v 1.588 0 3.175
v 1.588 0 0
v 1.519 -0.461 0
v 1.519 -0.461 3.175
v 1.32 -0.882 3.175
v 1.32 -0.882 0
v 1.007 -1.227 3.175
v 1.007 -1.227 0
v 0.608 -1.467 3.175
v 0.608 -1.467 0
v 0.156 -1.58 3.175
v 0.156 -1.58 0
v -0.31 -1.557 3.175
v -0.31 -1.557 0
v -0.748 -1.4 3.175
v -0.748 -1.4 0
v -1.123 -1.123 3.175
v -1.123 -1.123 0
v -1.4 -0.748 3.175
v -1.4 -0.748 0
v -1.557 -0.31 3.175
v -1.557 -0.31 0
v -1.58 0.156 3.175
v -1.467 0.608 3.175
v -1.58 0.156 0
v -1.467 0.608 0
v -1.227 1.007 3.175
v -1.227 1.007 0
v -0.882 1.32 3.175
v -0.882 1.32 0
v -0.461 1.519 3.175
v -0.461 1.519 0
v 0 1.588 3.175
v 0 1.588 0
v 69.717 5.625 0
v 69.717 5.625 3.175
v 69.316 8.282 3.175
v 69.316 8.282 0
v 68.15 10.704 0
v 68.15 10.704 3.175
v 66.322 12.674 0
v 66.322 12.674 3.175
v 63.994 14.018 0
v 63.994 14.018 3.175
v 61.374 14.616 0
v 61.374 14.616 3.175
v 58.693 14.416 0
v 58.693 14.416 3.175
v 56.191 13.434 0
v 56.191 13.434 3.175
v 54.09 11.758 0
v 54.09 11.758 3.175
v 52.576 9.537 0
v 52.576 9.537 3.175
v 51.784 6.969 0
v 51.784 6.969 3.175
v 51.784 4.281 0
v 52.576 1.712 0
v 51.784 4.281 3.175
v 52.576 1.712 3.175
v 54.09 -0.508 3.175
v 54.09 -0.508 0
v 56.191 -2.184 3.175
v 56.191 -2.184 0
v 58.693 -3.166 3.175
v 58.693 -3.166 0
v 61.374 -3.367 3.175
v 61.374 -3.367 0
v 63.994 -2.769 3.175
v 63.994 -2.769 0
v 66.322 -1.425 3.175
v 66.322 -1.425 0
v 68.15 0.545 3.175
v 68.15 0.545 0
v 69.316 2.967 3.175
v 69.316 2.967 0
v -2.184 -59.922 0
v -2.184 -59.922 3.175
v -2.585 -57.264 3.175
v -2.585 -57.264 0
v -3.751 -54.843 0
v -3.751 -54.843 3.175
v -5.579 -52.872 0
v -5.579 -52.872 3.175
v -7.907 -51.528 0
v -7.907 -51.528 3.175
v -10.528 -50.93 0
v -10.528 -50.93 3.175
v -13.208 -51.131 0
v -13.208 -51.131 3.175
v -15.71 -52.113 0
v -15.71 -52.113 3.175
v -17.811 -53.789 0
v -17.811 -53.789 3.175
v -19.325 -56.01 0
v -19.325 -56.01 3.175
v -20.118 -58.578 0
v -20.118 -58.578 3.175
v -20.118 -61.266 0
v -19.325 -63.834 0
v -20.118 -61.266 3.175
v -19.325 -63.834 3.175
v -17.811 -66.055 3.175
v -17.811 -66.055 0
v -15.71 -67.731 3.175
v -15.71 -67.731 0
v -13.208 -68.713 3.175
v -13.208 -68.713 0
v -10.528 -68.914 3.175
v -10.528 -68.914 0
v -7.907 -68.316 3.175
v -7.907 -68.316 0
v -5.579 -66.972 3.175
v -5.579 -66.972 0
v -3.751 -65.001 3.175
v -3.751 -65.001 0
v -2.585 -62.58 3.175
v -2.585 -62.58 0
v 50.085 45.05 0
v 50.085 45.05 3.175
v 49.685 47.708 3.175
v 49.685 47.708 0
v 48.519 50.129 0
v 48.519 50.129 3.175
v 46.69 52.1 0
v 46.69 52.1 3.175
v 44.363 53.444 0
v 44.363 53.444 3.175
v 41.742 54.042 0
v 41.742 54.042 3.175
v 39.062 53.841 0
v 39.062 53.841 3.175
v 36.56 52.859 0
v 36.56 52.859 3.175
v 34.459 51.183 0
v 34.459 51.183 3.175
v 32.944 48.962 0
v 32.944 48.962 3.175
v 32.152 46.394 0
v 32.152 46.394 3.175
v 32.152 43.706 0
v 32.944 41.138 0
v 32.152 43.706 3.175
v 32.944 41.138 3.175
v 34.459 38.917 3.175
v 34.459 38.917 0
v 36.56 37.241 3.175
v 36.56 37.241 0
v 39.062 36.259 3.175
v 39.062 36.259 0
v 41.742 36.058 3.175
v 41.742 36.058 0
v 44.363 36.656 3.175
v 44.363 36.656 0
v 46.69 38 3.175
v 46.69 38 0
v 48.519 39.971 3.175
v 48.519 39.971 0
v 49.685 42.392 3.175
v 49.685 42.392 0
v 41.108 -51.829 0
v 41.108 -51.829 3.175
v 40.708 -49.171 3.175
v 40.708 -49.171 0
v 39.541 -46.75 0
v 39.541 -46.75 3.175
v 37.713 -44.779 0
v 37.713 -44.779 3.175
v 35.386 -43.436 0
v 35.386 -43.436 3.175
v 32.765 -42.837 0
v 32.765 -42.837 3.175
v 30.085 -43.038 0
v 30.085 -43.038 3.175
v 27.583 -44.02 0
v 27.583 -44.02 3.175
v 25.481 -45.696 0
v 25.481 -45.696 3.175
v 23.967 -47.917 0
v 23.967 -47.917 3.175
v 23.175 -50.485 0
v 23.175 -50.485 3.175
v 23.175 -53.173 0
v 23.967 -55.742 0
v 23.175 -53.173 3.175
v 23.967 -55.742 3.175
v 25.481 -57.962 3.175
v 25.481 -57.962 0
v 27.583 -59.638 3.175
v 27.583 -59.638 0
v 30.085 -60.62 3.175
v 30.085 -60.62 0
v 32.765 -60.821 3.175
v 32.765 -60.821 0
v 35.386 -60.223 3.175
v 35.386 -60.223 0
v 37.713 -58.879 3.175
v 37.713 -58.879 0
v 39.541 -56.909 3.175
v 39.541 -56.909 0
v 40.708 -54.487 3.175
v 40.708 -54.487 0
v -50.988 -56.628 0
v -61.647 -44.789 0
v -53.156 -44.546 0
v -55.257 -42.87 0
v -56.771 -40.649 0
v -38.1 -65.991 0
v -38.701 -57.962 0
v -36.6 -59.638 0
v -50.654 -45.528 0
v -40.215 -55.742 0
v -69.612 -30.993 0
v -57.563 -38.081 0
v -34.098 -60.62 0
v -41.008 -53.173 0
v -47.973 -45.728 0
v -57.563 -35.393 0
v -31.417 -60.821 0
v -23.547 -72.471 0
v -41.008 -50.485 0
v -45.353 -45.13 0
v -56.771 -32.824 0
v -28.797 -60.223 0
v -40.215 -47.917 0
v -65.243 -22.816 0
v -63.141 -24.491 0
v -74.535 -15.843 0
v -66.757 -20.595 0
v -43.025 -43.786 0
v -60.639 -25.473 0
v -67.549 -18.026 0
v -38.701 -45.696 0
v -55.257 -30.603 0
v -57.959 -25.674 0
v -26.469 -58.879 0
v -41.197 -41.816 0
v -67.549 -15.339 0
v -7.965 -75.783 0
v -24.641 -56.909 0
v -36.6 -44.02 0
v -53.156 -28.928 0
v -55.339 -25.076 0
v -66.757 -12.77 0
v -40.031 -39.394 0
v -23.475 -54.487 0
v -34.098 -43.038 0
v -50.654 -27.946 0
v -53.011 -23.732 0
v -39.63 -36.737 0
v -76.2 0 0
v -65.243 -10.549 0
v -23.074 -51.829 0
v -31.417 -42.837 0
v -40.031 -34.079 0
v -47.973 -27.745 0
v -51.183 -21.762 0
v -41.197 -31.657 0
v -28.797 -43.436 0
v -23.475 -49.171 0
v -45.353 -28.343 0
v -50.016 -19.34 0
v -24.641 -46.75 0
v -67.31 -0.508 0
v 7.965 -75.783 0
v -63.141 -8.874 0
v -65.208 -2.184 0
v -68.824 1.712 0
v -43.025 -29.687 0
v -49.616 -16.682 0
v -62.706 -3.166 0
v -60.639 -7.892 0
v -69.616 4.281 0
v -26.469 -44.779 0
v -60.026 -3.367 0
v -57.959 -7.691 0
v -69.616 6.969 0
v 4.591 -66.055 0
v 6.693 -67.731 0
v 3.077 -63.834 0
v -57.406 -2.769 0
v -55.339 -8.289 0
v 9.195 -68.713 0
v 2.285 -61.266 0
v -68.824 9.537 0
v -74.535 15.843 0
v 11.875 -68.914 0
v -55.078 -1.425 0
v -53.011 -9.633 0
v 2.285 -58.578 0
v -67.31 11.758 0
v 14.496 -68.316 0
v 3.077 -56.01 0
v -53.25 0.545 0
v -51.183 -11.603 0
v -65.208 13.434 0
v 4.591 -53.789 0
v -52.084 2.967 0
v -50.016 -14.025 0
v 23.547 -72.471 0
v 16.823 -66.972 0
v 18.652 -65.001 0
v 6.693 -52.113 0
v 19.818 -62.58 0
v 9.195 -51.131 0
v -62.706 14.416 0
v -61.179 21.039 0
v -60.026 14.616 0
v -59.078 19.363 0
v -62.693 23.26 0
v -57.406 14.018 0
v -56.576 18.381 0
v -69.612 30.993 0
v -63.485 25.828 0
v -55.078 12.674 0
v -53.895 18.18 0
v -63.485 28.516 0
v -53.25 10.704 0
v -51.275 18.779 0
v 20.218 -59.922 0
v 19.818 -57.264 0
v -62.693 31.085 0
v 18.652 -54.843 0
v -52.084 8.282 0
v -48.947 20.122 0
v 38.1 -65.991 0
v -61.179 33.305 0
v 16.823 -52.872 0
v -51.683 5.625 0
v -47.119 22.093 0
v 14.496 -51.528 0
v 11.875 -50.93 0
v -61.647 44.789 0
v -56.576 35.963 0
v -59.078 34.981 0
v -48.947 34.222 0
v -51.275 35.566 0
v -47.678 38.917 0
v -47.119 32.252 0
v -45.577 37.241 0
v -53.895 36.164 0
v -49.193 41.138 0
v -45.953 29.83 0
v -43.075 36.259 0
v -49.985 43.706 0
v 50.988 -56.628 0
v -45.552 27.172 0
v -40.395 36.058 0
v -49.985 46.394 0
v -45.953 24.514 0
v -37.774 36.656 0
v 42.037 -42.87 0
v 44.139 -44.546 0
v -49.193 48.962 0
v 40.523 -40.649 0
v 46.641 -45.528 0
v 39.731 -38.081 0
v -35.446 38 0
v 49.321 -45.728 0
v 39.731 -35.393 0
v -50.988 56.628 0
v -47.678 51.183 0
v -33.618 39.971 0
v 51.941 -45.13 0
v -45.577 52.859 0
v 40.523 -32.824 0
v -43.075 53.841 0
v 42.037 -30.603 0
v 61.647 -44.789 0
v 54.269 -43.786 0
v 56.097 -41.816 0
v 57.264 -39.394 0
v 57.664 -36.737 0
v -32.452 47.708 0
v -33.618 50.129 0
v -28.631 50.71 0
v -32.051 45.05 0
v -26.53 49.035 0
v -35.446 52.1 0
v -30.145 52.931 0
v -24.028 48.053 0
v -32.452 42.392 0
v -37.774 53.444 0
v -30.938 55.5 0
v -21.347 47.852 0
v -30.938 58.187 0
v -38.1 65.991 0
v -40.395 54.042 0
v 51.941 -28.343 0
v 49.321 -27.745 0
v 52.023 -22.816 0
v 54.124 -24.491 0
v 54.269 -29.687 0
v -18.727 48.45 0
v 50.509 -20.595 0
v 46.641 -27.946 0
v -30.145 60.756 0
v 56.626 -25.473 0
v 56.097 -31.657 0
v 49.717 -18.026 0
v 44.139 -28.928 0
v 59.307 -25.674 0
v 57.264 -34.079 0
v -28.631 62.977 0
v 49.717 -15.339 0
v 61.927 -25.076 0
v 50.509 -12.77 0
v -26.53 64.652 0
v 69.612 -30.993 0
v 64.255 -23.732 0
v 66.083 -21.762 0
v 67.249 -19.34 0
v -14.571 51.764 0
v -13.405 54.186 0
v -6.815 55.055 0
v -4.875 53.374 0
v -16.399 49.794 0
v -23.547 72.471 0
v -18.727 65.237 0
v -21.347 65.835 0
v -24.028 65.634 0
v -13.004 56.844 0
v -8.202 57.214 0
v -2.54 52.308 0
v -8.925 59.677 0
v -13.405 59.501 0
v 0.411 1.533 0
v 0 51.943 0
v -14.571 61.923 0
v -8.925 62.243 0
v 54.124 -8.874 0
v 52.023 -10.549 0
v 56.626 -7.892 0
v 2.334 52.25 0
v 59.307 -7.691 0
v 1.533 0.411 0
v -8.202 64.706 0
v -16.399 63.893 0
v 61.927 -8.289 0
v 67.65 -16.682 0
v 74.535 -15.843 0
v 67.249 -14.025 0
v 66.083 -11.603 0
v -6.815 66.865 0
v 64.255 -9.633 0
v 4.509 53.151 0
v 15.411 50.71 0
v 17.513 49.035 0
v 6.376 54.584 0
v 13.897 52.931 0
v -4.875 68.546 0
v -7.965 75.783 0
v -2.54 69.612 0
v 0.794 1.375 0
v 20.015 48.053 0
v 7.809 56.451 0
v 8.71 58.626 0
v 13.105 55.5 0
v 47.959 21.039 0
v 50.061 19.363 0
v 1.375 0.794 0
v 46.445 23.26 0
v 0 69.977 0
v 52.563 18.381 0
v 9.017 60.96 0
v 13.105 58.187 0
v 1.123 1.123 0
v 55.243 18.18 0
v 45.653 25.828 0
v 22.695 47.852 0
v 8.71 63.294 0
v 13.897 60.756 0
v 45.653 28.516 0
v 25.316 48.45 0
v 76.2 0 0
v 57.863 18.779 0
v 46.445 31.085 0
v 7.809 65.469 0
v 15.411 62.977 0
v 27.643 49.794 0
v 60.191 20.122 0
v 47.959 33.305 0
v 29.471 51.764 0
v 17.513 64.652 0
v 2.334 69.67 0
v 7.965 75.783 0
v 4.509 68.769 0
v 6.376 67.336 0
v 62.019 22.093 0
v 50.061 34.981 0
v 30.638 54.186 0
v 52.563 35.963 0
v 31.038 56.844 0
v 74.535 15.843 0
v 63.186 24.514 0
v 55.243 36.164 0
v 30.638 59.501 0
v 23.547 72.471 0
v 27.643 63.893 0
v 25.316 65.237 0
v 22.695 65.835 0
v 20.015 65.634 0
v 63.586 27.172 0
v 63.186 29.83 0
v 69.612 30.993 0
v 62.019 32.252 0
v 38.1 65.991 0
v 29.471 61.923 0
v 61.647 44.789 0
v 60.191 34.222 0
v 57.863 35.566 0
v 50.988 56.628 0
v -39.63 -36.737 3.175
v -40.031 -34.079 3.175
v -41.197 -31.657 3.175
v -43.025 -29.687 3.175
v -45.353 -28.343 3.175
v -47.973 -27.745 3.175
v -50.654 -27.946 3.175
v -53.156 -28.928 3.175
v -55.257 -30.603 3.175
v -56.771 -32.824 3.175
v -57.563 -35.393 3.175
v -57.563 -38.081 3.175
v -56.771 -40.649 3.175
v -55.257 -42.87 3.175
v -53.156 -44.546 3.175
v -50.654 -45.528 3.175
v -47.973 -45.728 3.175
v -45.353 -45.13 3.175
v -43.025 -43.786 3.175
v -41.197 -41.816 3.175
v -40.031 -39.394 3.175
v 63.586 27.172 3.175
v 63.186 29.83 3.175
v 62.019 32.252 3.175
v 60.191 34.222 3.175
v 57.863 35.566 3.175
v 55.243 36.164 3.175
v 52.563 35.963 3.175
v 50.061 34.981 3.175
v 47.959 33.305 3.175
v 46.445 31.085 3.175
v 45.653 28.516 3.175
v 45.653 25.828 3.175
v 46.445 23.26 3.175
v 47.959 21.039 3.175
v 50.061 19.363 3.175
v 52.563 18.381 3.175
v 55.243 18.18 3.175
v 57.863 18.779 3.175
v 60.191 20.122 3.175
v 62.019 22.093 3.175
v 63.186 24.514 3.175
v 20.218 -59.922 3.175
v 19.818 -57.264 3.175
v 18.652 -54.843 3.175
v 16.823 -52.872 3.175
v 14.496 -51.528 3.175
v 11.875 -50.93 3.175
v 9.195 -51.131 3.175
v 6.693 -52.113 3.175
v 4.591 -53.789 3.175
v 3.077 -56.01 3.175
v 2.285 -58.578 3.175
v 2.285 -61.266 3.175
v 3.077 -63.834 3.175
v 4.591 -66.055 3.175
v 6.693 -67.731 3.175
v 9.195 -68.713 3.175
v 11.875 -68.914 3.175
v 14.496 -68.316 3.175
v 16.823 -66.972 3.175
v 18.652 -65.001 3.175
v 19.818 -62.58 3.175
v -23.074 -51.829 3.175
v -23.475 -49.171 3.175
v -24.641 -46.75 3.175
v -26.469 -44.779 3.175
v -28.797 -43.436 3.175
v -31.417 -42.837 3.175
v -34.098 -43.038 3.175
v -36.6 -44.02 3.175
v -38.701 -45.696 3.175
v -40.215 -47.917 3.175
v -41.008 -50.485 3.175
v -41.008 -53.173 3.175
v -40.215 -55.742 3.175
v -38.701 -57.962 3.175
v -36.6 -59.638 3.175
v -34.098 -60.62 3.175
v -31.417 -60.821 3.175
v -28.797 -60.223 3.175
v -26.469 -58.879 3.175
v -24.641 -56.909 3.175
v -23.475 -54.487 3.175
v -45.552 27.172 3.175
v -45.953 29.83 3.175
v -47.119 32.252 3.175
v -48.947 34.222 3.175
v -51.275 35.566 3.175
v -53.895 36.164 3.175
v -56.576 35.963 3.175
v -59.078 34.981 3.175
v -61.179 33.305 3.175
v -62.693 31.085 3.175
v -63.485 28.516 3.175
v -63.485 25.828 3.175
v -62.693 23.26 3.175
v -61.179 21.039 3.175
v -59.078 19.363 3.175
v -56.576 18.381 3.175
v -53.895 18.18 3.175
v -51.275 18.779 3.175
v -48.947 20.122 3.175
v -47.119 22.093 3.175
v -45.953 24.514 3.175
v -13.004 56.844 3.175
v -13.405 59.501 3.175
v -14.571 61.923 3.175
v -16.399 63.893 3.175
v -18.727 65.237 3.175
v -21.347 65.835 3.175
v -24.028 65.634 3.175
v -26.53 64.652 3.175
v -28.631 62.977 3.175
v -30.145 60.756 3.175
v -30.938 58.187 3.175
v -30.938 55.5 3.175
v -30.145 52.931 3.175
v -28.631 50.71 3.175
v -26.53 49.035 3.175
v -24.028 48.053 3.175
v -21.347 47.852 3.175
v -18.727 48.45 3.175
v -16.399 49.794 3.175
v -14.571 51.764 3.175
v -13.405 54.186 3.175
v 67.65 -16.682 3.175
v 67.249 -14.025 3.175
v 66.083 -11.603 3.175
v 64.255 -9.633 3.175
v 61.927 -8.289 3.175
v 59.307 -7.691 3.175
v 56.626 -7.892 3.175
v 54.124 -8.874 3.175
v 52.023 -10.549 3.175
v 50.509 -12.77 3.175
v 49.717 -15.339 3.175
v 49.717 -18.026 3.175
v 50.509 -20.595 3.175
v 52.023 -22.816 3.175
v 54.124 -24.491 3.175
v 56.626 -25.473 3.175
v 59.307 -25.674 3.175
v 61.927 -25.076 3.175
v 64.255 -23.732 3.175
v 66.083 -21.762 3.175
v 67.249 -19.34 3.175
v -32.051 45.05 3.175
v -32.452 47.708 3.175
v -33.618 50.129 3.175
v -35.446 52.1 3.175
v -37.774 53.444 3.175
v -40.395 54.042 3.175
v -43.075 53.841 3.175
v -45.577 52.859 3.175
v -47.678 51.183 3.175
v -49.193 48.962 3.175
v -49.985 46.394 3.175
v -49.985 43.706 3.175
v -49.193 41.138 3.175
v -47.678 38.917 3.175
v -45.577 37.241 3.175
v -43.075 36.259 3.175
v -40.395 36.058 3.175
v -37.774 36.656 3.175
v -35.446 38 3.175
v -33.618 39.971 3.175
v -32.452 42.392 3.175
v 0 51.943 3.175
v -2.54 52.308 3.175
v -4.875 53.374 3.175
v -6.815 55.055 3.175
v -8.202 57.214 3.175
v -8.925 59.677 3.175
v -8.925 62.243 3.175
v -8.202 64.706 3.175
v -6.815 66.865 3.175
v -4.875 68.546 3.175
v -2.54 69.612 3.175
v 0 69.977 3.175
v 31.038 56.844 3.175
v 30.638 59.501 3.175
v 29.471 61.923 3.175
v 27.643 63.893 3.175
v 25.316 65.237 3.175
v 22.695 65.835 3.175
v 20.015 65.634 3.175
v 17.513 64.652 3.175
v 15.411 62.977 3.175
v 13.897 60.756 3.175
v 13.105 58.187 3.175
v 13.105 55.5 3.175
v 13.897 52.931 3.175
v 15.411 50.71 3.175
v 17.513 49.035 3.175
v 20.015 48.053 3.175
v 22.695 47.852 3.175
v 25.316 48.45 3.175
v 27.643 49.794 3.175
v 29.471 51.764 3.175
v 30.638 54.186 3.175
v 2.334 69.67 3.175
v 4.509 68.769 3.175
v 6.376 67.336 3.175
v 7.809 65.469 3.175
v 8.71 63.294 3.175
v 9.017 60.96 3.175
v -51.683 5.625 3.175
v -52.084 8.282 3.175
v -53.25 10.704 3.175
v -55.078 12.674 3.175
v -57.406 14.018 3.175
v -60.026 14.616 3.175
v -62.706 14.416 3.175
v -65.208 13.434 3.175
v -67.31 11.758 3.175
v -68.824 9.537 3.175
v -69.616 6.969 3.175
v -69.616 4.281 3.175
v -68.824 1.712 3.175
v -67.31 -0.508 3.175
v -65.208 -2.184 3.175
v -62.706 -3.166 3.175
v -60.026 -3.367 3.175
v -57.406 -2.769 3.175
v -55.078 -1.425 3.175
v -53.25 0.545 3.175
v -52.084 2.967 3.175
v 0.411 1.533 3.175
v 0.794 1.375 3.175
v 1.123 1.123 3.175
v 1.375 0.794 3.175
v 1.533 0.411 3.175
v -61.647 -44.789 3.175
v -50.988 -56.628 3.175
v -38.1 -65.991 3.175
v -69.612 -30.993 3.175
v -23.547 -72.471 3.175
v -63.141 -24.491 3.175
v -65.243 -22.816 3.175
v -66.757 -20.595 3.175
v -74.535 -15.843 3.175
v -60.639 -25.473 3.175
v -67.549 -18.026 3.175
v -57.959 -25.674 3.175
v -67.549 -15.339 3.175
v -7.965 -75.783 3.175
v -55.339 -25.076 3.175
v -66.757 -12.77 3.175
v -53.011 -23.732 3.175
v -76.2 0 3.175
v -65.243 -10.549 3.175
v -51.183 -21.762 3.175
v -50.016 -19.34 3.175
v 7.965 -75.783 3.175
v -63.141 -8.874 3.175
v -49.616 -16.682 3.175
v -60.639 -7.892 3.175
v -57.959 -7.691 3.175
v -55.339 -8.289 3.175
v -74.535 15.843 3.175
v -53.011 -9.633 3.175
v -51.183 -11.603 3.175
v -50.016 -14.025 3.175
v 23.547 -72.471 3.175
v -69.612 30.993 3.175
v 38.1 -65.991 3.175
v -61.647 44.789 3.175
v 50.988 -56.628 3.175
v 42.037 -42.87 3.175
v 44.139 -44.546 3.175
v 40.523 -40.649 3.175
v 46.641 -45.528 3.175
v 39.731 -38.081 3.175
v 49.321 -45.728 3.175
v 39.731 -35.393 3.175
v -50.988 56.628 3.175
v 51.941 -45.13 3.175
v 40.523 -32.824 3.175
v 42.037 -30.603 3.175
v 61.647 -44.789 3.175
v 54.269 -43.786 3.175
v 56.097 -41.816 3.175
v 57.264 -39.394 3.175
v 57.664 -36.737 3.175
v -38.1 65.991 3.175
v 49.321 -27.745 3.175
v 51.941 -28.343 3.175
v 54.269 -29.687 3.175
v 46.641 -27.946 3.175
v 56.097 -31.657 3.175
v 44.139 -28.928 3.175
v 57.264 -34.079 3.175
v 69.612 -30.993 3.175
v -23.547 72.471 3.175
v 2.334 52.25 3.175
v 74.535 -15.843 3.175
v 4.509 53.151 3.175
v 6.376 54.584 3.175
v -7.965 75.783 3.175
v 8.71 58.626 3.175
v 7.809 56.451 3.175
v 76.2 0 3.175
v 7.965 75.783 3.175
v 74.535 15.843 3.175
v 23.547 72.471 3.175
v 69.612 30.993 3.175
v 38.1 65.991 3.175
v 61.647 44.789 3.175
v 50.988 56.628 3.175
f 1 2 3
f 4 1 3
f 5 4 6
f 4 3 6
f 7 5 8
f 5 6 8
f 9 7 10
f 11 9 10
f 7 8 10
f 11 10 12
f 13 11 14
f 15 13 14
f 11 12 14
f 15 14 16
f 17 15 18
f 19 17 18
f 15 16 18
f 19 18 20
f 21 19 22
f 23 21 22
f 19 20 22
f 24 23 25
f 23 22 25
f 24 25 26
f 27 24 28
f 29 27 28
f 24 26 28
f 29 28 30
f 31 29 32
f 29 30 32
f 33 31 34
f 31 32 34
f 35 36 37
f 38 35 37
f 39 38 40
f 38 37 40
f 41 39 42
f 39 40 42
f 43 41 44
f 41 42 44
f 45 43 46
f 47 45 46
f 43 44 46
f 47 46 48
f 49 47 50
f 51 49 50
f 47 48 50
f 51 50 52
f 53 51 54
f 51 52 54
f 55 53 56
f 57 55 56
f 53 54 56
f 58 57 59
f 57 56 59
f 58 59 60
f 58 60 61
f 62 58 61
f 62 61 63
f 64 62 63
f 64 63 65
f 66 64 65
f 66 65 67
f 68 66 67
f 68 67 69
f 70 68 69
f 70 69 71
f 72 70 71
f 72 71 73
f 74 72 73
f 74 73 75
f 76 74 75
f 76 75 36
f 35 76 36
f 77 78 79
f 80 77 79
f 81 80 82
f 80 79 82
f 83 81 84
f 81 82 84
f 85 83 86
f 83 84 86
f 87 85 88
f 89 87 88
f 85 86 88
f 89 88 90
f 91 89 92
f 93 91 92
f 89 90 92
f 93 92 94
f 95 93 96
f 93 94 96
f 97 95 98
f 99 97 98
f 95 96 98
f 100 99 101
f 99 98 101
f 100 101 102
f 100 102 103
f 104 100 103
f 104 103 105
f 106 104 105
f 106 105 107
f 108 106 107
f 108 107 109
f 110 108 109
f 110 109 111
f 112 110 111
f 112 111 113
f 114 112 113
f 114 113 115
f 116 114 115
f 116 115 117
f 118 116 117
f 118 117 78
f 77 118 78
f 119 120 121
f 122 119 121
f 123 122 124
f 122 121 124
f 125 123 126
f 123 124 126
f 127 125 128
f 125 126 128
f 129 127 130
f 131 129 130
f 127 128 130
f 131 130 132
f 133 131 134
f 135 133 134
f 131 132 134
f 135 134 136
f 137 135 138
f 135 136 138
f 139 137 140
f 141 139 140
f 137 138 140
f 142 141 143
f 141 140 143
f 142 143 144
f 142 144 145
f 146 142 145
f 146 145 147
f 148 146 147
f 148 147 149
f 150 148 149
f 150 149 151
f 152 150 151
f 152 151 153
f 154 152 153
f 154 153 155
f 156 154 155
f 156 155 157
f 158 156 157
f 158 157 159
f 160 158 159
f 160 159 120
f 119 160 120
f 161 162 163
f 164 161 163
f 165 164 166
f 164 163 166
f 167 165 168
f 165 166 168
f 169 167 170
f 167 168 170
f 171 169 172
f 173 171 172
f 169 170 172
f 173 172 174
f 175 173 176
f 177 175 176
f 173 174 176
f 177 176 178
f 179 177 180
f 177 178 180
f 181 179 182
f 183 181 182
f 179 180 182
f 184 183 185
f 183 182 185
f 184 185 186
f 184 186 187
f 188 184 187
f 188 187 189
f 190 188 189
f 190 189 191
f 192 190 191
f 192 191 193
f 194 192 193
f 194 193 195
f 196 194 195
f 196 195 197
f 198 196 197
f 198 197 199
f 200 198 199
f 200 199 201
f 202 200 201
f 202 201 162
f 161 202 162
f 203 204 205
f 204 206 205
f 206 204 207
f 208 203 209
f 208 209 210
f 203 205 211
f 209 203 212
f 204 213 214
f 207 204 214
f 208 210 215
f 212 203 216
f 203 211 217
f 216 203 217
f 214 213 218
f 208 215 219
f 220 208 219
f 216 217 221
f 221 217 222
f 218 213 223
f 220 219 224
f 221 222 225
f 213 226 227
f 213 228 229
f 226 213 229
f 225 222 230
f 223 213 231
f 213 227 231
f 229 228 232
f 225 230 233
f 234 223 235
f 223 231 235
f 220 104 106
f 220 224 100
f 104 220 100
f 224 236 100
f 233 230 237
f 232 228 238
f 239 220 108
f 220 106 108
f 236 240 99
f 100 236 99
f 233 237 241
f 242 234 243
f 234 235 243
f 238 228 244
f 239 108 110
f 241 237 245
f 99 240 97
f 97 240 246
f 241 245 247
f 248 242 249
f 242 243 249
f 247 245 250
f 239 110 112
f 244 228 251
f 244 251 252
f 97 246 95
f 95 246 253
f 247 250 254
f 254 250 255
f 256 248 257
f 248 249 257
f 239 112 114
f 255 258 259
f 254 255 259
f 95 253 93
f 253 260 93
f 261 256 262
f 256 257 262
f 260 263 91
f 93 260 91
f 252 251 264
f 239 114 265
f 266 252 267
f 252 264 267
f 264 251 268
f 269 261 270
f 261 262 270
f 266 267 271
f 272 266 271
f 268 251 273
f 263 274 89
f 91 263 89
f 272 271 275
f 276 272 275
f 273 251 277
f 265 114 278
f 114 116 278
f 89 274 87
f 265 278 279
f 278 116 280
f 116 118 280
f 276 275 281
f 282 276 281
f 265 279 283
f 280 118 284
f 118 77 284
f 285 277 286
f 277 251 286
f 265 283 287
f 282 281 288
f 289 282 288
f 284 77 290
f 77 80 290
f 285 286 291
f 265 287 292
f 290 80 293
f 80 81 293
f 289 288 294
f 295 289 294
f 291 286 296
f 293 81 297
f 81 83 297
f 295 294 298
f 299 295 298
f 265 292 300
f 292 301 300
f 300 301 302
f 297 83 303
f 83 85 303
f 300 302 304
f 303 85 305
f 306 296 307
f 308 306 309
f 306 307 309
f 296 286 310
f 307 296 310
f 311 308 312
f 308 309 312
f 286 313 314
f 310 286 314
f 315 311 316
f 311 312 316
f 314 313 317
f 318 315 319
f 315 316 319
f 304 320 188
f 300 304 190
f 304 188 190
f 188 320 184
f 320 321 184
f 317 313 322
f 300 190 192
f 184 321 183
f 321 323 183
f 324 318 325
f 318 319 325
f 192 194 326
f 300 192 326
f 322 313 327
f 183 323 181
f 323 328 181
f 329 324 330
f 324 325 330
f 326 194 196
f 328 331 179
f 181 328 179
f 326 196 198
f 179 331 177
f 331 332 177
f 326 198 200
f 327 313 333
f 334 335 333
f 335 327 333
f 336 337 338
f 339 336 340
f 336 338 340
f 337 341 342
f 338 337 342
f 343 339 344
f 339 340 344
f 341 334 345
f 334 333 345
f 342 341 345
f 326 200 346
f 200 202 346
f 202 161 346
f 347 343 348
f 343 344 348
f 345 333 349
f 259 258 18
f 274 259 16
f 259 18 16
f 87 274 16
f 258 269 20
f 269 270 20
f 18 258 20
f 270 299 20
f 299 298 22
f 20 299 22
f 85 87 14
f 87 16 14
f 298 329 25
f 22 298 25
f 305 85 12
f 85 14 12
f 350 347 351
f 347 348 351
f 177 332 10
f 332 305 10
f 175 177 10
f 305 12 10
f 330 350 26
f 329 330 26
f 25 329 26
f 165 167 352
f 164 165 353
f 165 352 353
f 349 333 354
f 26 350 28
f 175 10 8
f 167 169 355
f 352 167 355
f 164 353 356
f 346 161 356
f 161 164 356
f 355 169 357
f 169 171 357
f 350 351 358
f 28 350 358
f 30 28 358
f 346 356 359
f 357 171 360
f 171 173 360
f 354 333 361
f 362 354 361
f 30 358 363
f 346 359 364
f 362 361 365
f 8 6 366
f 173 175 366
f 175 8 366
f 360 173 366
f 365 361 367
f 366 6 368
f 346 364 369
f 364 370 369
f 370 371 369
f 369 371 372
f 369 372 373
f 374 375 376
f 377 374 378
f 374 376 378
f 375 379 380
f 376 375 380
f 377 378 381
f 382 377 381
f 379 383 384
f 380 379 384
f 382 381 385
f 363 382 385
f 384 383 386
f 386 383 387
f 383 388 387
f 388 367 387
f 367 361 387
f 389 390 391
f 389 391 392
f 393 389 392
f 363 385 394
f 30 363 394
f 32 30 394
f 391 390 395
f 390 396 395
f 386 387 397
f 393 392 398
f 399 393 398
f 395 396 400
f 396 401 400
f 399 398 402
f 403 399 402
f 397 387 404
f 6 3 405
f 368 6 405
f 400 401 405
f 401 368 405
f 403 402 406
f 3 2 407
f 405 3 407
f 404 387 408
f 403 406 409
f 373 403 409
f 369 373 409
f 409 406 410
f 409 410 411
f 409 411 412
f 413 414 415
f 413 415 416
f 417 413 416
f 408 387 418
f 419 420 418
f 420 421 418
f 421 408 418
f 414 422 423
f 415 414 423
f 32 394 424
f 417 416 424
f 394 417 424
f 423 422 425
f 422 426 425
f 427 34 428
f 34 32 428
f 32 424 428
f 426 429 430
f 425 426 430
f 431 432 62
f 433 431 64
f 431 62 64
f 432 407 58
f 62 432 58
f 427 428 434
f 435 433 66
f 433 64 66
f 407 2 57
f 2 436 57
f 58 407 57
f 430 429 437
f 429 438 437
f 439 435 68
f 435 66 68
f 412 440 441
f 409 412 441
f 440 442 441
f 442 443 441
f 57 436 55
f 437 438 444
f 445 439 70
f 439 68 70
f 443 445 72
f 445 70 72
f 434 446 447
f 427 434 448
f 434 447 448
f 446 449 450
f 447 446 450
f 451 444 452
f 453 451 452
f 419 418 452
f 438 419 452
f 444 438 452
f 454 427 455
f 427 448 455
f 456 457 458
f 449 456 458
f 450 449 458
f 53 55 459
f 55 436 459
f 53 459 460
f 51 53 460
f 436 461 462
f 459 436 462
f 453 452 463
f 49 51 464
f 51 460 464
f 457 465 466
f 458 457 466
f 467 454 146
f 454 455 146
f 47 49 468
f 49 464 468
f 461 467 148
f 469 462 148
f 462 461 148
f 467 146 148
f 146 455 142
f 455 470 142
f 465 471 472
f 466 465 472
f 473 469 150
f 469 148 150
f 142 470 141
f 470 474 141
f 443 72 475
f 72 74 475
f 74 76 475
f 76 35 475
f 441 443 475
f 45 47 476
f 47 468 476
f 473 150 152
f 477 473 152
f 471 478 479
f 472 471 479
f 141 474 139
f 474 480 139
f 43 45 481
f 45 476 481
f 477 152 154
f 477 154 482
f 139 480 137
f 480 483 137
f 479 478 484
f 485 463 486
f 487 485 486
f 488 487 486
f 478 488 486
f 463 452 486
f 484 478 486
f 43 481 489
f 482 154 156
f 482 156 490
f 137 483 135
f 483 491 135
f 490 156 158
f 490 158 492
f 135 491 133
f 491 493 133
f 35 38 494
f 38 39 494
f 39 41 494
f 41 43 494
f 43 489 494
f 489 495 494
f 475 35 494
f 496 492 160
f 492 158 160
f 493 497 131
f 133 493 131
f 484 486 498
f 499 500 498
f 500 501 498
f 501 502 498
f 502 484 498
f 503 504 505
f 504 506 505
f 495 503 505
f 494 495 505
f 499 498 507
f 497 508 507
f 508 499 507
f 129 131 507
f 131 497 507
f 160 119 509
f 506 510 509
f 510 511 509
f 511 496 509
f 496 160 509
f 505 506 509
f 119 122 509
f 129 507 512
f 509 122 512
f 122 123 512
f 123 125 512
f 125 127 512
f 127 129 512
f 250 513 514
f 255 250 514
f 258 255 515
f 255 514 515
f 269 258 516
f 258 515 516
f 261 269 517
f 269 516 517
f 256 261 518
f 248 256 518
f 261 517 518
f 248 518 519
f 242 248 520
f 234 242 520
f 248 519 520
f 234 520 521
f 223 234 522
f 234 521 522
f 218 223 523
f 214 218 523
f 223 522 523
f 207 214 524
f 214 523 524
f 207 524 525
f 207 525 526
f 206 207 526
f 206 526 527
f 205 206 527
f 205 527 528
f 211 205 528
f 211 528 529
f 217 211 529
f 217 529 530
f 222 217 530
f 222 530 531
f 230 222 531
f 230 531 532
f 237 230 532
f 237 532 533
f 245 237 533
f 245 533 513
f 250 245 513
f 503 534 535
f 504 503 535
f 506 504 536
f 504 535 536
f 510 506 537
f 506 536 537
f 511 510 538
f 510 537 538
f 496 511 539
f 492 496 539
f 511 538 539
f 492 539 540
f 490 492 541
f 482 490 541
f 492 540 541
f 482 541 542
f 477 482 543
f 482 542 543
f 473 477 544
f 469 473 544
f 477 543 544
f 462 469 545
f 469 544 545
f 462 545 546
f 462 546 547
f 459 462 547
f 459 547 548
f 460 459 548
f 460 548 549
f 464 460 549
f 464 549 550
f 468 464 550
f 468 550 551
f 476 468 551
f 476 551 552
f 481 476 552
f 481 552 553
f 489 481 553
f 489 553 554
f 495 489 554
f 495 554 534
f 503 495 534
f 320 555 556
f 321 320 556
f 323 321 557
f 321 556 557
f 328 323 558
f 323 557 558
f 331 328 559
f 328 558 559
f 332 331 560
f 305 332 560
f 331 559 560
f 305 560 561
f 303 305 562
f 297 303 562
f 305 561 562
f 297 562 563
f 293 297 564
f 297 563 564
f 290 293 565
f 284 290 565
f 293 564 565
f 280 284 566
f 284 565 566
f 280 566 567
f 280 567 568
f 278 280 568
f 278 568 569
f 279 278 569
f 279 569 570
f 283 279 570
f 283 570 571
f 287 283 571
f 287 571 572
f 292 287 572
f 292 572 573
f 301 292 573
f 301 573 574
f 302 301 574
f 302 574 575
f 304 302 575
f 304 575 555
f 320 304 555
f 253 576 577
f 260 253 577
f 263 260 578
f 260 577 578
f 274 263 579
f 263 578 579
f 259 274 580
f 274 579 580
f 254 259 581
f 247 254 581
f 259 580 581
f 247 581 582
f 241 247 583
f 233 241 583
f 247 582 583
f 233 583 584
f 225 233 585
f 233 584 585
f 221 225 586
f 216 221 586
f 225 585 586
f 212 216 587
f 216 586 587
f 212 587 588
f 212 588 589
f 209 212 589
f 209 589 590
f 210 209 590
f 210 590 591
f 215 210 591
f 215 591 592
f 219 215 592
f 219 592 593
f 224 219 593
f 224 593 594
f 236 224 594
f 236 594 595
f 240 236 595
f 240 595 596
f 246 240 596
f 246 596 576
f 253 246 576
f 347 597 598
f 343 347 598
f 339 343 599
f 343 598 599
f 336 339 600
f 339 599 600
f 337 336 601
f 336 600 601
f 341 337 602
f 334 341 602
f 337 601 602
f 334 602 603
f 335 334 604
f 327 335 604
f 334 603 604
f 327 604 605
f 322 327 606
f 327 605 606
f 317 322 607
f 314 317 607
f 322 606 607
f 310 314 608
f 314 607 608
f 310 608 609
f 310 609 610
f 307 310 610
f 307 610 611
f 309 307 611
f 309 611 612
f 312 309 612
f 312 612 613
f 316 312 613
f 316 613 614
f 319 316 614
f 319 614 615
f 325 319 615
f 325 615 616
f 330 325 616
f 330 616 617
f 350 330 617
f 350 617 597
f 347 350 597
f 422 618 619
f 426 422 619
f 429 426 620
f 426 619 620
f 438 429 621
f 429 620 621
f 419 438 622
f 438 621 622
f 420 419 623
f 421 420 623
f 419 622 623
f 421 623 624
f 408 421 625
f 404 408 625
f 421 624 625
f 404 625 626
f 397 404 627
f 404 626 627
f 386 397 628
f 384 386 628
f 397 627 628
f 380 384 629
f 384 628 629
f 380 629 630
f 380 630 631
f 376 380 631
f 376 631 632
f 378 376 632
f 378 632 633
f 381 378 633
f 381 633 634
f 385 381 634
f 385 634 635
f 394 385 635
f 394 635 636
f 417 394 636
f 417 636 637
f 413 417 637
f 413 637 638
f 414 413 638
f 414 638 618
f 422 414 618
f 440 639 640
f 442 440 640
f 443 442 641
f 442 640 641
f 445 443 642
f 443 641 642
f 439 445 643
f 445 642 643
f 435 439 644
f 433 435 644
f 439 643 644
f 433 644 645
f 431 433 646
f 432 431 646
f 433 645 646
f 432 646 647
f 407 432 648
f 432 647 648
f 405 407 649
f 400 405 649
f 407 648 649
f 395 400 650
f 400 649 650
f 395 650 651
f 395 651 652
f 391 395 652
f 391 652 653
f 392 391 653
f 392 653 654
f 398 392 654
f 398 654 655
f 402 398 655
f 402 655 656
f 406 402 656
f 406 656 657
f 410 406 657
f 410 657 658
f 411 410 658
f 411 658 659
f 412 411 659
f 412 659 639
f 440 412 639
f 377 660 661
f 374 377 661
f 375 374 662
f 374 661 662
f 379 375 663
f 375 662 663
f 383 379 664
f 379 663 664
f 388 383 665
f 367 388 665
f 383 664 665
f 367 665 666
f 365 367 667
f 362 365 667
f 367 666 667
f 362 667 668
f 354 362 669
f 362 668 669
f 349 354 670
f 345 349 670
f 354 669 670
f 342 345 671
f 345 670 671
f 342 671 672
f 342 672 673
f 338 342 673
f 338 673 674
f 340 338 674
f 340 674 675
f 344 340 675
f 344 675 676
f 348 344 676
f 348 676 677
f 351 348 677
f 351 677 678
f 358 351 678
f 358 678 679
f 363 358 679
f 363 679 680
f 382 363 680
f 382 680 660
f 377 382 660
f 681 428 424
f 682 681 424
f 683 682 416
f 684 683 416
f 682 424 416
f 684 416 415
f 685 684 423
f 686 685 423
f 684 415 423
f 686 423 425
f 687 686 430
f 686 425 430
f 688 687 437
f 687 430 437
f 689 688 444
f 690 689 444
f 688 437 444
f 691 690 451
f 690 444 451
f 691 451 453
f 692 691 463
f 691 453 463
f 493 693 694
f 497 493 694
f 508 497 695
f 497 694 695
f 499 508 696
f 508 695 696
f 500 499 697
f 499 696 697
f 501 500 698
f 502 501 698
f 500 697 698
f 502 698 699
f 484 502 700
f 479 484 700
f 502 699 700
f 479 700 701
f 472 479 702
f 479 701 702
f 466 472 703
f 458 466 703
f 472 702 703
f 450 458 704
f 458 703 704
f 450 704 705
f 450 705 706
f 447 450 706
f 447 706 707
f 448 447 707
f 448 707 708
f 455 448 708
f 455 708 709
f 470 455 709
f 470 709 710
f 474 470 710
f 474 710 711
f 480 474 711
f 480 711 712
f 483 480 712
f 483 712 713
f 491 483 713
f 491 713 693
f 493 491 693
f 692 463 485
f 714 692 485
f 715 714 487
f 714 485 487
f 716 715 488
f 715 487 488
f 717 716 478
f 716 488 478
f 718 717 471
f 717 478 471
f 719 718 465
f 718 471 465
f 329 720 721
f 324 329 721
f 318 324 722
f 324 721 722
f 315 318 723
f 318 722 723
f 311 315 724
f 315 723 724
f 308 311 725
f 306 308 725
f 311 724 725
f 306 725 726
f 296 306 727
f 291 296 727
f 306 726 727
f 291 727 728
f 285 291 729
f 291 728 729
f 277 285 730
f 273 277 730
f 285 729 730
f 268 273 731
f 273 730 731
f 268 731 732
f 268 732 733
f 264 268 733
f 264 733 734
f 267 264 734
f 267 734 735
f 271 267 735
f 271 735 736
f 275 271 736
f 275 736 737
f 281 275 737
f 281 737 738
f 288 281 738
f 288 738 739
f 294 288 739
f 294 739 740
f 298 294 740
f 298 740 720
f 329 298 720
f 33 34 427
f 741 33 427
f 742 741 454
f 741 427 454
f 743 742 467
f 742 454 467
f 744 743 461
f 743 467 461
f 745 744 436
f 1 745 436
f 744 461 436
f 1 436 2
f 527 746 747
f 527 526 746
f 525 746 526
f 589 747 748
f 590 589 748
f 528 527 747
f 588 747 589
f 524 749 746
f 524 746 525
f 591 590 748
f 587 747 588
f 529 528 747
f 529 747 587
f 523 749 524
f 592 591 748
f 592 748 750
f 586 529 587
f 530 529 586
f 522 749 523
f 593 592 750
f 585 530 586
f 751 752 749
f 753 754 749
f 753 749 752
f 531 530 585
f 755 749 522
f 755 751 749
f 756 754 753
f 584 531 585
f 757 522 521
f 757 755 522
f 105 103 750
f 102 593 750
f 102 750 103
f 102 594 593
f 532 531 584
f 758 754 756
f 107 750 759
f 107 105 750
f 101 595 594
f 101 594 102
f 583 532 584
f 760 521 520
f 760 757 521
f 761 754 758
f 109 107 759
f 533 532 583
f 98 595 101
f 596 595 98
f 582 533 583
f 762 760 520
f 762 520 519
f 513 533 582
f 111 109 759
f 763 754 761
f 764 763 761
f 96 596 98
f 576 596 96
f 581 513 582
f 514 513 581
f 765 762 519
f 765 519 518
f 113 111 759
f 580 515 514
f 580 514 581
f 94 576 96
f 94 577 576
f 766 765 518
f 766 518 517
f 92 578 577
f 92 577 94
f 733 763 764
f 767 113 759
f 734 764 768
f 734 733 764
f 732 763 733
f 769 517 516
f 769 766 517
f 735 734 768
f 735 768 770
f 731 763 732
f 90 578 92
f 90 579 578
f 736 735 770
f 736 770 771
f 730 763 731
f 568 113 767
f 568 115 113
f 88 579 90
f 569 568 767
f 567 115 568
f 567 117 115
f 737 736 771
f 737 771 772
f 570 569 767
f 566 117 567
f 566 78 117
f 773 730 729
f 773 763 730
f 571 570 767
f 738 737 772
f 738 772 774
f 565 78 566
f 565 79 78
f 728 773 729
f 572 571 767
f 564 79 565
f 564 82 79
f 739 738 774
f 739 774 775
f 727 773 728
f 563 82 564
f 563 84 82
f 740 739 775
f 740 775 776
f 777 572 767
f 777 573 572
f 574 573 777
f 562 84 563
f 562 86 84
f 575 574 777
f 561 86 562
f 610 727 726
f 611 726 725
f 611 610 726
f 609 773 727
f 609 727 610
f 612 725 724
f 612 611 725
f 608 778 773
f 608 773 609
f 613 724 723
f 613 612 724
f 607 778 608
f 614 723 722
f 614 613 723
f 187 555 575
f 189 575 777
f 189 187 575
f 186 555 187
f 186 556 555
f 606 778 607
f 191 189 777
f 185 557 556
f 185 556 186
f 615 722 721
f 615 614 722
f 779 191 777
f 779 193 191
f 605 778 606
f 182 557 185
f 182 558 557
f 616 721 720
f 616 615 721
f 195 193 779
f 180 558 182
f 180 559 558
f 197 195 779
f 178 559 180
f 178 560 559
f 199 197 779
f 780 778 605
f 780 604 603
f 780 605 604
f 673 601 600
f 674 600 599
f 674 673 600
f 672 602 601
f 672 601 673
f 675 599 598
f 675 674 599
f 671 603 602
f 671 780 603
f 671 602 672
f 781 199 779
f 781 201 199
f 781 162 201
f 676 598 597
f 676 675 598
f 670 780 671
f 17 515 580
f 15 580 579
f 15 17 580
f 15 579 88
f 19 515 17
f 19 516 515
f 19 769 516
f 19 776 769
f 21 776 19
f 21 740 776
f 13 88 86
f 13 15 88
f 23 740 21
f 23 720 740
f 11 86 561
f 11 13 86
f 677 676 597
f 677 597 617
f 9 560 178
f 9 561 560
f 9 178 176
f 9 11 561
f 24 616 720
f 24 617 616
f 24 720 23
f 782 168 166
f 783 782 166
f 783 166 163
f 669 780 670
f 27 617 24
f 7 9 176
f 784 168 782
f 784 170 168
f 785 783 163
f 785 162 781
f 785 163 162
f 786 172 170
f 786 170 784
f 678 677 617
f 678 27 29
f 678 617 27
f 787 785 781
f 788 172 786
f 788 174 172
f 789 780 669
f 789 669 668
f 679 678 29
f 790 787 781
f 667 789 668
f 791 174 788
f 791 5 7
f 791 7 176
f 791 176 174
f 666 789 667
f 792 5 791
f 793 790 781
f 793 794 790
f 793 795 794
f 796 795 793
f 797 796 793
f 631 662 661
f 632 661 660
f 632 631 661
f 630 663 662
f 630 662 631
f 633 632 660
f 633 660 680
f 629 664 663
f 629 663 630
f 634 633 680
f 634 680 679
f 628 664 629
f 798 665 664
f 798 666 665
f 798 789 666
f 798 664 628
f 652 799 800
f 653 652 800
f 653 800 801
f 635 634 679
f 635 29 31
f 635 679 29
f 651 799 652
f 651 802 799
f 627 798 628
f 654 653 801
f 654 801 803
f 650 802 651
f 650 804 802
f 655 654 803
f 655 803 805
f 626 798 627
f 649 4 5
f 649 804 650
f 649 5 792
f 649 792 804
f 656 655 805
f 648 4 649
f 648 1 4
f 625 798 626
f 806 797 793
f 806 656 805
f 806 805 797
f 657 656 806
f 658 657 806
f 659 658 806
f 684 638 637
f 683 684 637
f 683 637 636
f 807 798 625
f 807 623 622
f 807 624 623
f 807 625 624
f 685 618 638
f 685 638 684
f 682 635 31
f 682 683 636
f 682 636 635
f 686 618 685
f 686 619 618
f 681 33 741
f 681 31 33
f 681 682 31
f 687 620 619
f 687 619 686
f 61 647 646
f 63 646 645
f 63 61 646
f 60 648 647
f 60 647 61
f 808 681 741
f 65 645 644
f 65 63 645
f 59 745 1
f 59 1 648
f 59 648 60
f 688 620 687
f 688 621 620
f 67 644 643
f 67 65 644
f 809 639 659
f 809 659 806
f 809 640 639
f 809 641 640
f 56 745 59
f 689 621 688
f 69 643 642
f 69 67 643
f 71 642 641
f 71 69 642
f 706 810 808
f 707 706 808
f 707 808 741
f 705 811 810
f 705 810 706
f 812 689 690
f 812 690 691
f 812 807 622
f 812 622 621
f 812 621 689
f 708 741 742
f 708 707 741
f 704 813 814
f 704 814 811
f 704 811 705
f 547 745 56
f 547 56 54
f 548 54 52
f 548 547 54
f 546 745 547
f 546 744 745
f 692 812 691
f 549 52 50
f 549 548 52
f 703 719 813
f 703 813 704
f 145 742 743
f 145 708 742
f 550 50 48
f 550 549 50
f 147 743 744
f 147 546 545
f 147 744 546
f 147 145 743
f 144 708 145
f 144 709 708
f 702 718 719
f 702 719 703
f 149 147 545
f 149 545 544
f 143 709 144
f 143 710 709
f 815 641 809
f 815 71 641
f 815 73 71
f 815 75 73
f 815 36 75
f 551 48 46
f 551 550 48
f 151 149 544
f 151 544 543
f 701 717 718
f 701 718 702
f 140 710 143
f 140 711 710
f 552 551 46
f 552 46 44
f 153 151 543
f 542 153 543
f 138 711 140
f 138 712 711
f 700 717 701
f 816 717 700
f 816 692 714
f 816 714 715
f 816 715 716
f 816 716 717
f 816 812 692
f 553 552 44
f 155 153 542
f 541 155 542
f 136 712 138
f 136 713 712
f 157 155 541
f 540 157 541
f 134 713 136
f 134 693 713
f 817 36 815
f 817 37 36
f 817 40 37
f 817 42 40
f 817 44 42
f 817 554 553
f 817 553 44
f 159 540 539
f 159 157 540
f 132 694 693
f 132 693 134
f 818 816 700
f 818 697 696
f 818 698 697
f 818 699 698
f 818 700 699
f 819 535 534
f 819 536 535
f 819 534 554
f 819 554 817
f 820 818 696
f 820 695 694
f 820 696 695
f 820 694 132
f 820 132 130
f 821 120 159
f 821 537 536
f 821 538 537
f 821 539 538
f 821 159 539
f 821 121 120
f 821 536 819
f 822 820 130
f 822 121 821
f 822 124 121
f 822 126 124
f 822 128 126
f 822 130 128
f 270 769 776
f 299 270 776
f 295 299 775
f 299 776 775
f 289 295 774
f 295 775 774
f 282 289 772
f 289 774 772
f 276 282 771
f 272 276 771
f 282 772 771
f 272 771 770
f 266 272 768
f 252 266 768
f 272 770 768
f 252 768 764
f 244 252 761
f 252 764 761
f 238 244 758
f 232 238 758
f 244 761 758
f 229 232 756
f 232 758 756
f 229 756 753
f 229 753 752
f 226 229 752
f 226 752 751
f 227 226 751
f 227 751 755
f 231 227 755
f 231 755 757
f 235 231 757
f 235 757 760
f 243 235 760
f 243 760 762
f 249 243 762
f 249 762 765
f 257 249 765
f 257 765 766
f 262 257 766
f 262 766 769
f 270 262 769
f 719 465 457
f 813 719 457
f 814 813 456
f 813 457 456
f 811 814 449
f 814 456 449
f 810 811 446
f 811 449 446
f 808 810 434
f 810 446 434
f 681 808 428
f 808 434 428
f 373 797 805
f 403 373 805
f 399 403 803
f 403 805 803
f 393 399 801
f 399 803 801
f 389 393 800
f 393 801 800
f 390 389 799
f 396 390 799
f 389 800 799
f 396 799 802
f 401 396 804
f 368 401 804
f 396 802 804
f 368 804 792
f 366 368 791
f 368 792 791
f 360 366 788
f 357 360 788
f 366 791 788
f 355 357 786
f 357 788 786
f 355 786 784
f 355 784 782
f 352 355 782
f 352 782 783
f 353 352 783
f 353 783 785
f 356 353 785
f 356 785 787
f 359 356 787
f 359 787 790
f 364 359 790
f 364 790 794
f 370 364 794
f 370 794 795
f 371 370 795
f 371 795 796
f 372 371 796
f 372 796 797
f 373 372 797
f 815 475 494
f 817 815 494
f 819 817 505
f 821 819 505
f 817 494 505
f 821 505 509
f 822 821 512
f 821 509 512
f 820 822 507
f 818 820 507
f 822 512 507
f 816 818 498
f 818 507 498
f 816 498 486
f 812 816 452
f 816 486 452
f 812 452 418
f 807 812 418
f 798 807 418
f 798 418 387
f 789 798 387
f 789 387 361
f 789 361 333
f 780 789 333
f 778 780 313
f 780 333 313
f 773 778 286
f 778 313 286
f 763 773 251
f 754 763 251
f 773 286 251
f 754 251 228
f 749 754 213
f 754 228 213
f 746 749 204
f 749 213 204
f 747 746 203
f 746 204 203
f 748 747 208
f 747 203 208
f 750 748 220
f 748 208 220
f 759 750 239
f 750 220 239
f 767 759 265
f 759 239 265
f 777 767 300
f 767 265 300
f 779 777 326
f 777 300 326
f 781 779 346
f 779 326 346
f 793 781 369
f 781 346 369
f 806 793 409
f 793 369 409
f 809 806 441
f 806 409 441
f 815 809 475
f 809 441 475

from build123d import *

# Parameters (mm, degrees)
F1_DEPTH  = 25.4
F2_DEPTH  = 3.175
F3_COUNT  = 17
F1_FACE_R = 9.017
F3_FACE_R = 9.017
F4_DEPTH  = 25.4


with BuildPart() as f1:
    # F0 (on Top) → F1 (new body)
    with BuildSketch(Plane.XY):
        with BuildLine():
            ThreePointArc((9.017, 60.96), (6.375981846, 67.335981846), (0, 69.977))
            Line((0, 69.977), (0, 51.943))
            ThreePointArc((0, 51.943), (6.375981846, 54.584018154), (9.017, 60.96))
        make_face()
        with BuildLine():
            Line((0, 51.943), (0, 69.977))
            ThreePointArc((0, 69.977), (-9.017, 60.96), (0, 51.943))
        make_face()
    extrude(amount=F1_DEPTH)


with BuildPart() as f2:
    # F0 (on Top) → F2 (new body)
    with BuildSketch(Plane.XY):
        with BuildLine():
            ThreePointArc((0, 76.2), (-53.8815367264, -53.8815367264), (76.2, 0))
            ThreePointArc((76.2, 0), (53.8815367264, 53.8815367264), (0, 76.2))
        make_face()
        with BuildLine():
            ThreePointArc((1.5875, 0), (-1.1225320151, -1.1225320151), (0, 1.5875))
            ThreePointArc((0, 1.5875), (1.1225320151, 1.1225320151), (1.5875, 0))
        make_face(mode=Mode.SUBTRACT)
        with BuildLine():
            ThreePointArc((0, 51.943), (-9.017, 60.96), (0, 69.977))
            ThreePointArc((0, 69.977), (6.375981846, 67.335981846), (9.017, 60.96))
            ThreePointArc((9.017, 60.96), (6.375981846, 54.584018154), (0, 51.943))
        make_face(mode=Mode.SUBTRACT)
    extrude(amount=F2_DEPTH)


with BuildPart() as f3_1:
    # F3: instance of F1
    add(f1.part.rotate(Axis((0, 0, 3.175), (0, 0, -1)), 1 * 360 / F3_COUNT))


with BuildPart() as f3_2:
    # F3: instance of F1
    add(f1.part.rotate(Axis((0, 0, 3.175), (0, 0, -1)), 2 * 360 / F3_COUNT))


with BuildPart() as f3_3:
    # F3: instance of F1
    add(f1.part.rotate(Axis((0, 0, 3.175), (0, 0, -1)), 3 * 360 / F3_COUNT))


with BuildPart() as f3_4:
    # F3: instance of F1
    add(f1.part.rotate(Axis((0, 0, 3.175), (0, 0, -1)), 4 * 360 / F3_COUNT))


with BuildPart() as f3_5:
    # F3: instance of F1
    add(f1.part.rotate(Axis((0, 0, 3.175), (0, 0, -1)), 5 * 360 / F3_COUNT))


with BuildPart() as f3_6:
    # F3: instance of F1
    add(f1.part.rotate(Axis((0, 0, 3.175), (0, 0, -1)), 6 * 360 / F3_COUNT))


with BuildPart() as f3_7:
    # F3: instance of F1
    add(f1.part.rotate(Axis((0, 0, 3.175), (0, 0, -1)), 7 * 360 / F3_COUNT))


with BuildPart() as f3_8:
    # F3: instance of F1
    add(f1.part.rotate(Axis((0, 0, 3.175), (0, 0, -1)), 8 * 360 / F3_COUNT))


with BuildPart() as f3_9:
    # F3: instance of F1
    add(f1.part.rotate(Axis((0, 0, 3.175), (0, 0, -1)), 9 * 360 / F3_COUNT))


with BuildPart() as f3_10:
    # F3: instance of F1
    add(f1.part.rotate(Axis((0, 0, 3.175), (0, 0, -1)), 10 * 360 / F3_COUNT))


with BuildPart() as f3_11:
    # F3: instance of F1
    add(f1.part.rotate(Axis((0, 0, 3.175), (0, 0, -1)), 11 * 360 / F3_COUNT))


with BuildPart() as f3_12:
    # F3: instance of F1
    add(f1.part.rotate(Axis((0, 0, 3.175), (0, 0, -1)), 12 * 360 / F3_COUNT))


with BuildPart() as f3_13:
    # F3: instance of F1
    add(f1.part.rotate(Axis((0, 0, 3.175), (0, 0, -1)), 13 * 360 / F3_COUNT))


with BuildPart() as f3_14:
    # F3: instance of F1
    add(f1.part.rotate(Axis((0, 0, 3.175), (0, 0, -1)), 14 * 360 / F3_COUNT))


with BuildPart() as f3_15:
    # F3: instance of F1
    add(f1.part.rotate(Axis((0, 0, 3.175), (0, 0, -1)), 15 * 360 / F3_COUNT))


with BuildPart() as f3_16:
    # F3: instance of F1
    add(f1.part.rotate(Axis((0, 0, 3.175), (0, 0, -1)), 16 * 360 / F3_COUNT))


with BuildPart() as f4_tool:
    # F1_face (on face) + F3_face (on face) → F4 (new body)
    with BuildSketch(Plane(origin=(0, 60.96, 25.4), x_dir=(1, 0, 0), z_dir=(0, 0, 1))):
        Circle(F1_FACE_R)
    with BuildSketch(Plane(origin=(22.0212919708, 56.8435071045, 25.4), x_dir=(1, 0, 0), z_dir=(0, 0, 1))):
        Circle(F3_FACE_R)
        with Locations((19.0471944659, -11.7935235107)):
            Circle(F3_FACE_R)
        with Locations((32.5478622702, -29.6712969364)):
            Circle(F3_FACE_R)
        with Locations((38.6786634162, -51.2188279116)):
            Circle(F3_FACE_R)
        with Locations((36.611599237, -73.5260029793)):
            Circle(F3_FACE_R)
        with Locations((26.6258382042, -93.5801145382)):
            Circle(F3_FACE_R)
        with Locations((10.0700126782, -108.6727436986)):
            Circle(F3_FACE_R)
        with Locations((-10.8199213647, -116.7655472612)):
            Circle(F3_FACE_R)
        with Locations((-33.2226625769, -116.7655472612)):
            Circle(F3_FACE_R)
        with Locations((-22.0212919708, 4.1164928955)):
            Circle(F3_FACE_R)
        with Locations((-44.0425839415, 0)):
            Circle(F3_FACE_R)
        with Locations((-63.0897784075, -11.7935235107)):
            Circle(F3_FACE_R)
        with Locations((-76.5904462118, -29.6712969364)):
            Circle(F3_FACE_R)
        with Locations((-80.6541831786, -73.5260029793)):
            Circle(F3_FACE_R)
        with Locations((-70.6684221458, -93.5801145382)):
            Circle(F3_FACE_R)
        with Locations((-54.1125966198, -108.6727436986)):
            Circle(F3_FACE_R)
        with Locations((-82.7212473577, -51.2188279116)):
            Circle(F3_FACE_R)
    extrude(amount=-F4_DEPTH)


with BuildPart() as f1_1:
    add(f1.part)

    # F4: cut by f4_tool
    add(f4_tool.part, mode=Mode.SUBTRACT)


with BuildPart() as f2_1:
    add(f2.part)

    # F4: cut by f4_tool
    add(f4_tool.part, mode=Mode.SUBTRACT)


with BuildPart() as f3_1_1:
    add(f3_1.part)

    # F4: cut by f4_tool
    add(f4_tool.part, mode=Mode.SUBTRACT)


with BuildPart() as f3_2_1:
    add(f3_2.part)

    # F4: cut by f4_tool
    add(f4_tool.part, mode=Mode.SUBTRACT)


with BuildPart() as f3_3_1:
    add(f3_3.part)

    # F4: cut by f4_tool
    add(f4_tool.part, mode=Mode.SUBTRACT)


with BuildPart() as f3_4_1:
    add(f3_4.part)

    # F4: cut by f4_tool
    add(f4_tool.part, mode=Mode.SUBTRACT)


with BuildPart() as f3_5_1:
    add(f3_5.part)

    # F4: cut by f4_tool
    add(f4_tool.part, mode=Mode.SUBTRACT)


with BuildPart() as f3_6_1:
    add(f3_6.part)

    # F4: cut by f4_tool
    add(f4_tool.part, mode=Mode.SUBTRACT)


with BuildPart() as f3_7_1:
    add(f3_7.part)

    # F4: cut by f4_tool
    add(f4_tool.part, mode=Mode.SUBTRACT)


with BuildPart() as f3_8_1:
    add(f3_8.part)

    # F4: cut by f4_tool
    add(f4_tool.part, mode=Mode.SUBTRACT)


with BuildPart() as f3_9_1:
    add(f3_9.part)

    # F4: cut by f4_tool
    add(f4_tool.part, mode=Mode.SUBTRACT)


with BuildPart() as f3_10_1:
    add(f3_10.part)

    # F4: cut by f4_tool
    add(f4_tool.part, mode=Mode.SUBTRACT)


with BuildPart() as f3_11_1:
    add(f3_11.part)

    # F4: cut by f4_tool
    add(f4_tool.part, mode=Mode.SUBTRACT)


with BuildPart() as f3_12_1:
    add(f3_12.part)

    # F4: cut by f4_tool
    add(f4_tool.part, mode=Mode.SUBTRACT)


with BuildPart() as f3_13_1:
    add(f3_13.part)

    # F4: cut by f4_tool
    add(f4_tool.part, mode=Mode.SUBTRACT)


with BuildPart() as f3_14_1:
    add(f3_14.part)

    # F4: cut by f4_tool
    add(f4_tool.part, mode=Mode.SUBTRACT)


with BuildPart() as f3_15_1:
    add(f3_15.part)

    # F4: cut by f4_tool
    add(f4_tool.part, mode=Mode.SUBTRACT)


with BuildPart() as f3_16_1:
    add(f3_16.part)

    # F4: cut by f4_tool
    add(f4_tool.part, mode=Mode.SUBTRACT)


solid = f2_1.part
